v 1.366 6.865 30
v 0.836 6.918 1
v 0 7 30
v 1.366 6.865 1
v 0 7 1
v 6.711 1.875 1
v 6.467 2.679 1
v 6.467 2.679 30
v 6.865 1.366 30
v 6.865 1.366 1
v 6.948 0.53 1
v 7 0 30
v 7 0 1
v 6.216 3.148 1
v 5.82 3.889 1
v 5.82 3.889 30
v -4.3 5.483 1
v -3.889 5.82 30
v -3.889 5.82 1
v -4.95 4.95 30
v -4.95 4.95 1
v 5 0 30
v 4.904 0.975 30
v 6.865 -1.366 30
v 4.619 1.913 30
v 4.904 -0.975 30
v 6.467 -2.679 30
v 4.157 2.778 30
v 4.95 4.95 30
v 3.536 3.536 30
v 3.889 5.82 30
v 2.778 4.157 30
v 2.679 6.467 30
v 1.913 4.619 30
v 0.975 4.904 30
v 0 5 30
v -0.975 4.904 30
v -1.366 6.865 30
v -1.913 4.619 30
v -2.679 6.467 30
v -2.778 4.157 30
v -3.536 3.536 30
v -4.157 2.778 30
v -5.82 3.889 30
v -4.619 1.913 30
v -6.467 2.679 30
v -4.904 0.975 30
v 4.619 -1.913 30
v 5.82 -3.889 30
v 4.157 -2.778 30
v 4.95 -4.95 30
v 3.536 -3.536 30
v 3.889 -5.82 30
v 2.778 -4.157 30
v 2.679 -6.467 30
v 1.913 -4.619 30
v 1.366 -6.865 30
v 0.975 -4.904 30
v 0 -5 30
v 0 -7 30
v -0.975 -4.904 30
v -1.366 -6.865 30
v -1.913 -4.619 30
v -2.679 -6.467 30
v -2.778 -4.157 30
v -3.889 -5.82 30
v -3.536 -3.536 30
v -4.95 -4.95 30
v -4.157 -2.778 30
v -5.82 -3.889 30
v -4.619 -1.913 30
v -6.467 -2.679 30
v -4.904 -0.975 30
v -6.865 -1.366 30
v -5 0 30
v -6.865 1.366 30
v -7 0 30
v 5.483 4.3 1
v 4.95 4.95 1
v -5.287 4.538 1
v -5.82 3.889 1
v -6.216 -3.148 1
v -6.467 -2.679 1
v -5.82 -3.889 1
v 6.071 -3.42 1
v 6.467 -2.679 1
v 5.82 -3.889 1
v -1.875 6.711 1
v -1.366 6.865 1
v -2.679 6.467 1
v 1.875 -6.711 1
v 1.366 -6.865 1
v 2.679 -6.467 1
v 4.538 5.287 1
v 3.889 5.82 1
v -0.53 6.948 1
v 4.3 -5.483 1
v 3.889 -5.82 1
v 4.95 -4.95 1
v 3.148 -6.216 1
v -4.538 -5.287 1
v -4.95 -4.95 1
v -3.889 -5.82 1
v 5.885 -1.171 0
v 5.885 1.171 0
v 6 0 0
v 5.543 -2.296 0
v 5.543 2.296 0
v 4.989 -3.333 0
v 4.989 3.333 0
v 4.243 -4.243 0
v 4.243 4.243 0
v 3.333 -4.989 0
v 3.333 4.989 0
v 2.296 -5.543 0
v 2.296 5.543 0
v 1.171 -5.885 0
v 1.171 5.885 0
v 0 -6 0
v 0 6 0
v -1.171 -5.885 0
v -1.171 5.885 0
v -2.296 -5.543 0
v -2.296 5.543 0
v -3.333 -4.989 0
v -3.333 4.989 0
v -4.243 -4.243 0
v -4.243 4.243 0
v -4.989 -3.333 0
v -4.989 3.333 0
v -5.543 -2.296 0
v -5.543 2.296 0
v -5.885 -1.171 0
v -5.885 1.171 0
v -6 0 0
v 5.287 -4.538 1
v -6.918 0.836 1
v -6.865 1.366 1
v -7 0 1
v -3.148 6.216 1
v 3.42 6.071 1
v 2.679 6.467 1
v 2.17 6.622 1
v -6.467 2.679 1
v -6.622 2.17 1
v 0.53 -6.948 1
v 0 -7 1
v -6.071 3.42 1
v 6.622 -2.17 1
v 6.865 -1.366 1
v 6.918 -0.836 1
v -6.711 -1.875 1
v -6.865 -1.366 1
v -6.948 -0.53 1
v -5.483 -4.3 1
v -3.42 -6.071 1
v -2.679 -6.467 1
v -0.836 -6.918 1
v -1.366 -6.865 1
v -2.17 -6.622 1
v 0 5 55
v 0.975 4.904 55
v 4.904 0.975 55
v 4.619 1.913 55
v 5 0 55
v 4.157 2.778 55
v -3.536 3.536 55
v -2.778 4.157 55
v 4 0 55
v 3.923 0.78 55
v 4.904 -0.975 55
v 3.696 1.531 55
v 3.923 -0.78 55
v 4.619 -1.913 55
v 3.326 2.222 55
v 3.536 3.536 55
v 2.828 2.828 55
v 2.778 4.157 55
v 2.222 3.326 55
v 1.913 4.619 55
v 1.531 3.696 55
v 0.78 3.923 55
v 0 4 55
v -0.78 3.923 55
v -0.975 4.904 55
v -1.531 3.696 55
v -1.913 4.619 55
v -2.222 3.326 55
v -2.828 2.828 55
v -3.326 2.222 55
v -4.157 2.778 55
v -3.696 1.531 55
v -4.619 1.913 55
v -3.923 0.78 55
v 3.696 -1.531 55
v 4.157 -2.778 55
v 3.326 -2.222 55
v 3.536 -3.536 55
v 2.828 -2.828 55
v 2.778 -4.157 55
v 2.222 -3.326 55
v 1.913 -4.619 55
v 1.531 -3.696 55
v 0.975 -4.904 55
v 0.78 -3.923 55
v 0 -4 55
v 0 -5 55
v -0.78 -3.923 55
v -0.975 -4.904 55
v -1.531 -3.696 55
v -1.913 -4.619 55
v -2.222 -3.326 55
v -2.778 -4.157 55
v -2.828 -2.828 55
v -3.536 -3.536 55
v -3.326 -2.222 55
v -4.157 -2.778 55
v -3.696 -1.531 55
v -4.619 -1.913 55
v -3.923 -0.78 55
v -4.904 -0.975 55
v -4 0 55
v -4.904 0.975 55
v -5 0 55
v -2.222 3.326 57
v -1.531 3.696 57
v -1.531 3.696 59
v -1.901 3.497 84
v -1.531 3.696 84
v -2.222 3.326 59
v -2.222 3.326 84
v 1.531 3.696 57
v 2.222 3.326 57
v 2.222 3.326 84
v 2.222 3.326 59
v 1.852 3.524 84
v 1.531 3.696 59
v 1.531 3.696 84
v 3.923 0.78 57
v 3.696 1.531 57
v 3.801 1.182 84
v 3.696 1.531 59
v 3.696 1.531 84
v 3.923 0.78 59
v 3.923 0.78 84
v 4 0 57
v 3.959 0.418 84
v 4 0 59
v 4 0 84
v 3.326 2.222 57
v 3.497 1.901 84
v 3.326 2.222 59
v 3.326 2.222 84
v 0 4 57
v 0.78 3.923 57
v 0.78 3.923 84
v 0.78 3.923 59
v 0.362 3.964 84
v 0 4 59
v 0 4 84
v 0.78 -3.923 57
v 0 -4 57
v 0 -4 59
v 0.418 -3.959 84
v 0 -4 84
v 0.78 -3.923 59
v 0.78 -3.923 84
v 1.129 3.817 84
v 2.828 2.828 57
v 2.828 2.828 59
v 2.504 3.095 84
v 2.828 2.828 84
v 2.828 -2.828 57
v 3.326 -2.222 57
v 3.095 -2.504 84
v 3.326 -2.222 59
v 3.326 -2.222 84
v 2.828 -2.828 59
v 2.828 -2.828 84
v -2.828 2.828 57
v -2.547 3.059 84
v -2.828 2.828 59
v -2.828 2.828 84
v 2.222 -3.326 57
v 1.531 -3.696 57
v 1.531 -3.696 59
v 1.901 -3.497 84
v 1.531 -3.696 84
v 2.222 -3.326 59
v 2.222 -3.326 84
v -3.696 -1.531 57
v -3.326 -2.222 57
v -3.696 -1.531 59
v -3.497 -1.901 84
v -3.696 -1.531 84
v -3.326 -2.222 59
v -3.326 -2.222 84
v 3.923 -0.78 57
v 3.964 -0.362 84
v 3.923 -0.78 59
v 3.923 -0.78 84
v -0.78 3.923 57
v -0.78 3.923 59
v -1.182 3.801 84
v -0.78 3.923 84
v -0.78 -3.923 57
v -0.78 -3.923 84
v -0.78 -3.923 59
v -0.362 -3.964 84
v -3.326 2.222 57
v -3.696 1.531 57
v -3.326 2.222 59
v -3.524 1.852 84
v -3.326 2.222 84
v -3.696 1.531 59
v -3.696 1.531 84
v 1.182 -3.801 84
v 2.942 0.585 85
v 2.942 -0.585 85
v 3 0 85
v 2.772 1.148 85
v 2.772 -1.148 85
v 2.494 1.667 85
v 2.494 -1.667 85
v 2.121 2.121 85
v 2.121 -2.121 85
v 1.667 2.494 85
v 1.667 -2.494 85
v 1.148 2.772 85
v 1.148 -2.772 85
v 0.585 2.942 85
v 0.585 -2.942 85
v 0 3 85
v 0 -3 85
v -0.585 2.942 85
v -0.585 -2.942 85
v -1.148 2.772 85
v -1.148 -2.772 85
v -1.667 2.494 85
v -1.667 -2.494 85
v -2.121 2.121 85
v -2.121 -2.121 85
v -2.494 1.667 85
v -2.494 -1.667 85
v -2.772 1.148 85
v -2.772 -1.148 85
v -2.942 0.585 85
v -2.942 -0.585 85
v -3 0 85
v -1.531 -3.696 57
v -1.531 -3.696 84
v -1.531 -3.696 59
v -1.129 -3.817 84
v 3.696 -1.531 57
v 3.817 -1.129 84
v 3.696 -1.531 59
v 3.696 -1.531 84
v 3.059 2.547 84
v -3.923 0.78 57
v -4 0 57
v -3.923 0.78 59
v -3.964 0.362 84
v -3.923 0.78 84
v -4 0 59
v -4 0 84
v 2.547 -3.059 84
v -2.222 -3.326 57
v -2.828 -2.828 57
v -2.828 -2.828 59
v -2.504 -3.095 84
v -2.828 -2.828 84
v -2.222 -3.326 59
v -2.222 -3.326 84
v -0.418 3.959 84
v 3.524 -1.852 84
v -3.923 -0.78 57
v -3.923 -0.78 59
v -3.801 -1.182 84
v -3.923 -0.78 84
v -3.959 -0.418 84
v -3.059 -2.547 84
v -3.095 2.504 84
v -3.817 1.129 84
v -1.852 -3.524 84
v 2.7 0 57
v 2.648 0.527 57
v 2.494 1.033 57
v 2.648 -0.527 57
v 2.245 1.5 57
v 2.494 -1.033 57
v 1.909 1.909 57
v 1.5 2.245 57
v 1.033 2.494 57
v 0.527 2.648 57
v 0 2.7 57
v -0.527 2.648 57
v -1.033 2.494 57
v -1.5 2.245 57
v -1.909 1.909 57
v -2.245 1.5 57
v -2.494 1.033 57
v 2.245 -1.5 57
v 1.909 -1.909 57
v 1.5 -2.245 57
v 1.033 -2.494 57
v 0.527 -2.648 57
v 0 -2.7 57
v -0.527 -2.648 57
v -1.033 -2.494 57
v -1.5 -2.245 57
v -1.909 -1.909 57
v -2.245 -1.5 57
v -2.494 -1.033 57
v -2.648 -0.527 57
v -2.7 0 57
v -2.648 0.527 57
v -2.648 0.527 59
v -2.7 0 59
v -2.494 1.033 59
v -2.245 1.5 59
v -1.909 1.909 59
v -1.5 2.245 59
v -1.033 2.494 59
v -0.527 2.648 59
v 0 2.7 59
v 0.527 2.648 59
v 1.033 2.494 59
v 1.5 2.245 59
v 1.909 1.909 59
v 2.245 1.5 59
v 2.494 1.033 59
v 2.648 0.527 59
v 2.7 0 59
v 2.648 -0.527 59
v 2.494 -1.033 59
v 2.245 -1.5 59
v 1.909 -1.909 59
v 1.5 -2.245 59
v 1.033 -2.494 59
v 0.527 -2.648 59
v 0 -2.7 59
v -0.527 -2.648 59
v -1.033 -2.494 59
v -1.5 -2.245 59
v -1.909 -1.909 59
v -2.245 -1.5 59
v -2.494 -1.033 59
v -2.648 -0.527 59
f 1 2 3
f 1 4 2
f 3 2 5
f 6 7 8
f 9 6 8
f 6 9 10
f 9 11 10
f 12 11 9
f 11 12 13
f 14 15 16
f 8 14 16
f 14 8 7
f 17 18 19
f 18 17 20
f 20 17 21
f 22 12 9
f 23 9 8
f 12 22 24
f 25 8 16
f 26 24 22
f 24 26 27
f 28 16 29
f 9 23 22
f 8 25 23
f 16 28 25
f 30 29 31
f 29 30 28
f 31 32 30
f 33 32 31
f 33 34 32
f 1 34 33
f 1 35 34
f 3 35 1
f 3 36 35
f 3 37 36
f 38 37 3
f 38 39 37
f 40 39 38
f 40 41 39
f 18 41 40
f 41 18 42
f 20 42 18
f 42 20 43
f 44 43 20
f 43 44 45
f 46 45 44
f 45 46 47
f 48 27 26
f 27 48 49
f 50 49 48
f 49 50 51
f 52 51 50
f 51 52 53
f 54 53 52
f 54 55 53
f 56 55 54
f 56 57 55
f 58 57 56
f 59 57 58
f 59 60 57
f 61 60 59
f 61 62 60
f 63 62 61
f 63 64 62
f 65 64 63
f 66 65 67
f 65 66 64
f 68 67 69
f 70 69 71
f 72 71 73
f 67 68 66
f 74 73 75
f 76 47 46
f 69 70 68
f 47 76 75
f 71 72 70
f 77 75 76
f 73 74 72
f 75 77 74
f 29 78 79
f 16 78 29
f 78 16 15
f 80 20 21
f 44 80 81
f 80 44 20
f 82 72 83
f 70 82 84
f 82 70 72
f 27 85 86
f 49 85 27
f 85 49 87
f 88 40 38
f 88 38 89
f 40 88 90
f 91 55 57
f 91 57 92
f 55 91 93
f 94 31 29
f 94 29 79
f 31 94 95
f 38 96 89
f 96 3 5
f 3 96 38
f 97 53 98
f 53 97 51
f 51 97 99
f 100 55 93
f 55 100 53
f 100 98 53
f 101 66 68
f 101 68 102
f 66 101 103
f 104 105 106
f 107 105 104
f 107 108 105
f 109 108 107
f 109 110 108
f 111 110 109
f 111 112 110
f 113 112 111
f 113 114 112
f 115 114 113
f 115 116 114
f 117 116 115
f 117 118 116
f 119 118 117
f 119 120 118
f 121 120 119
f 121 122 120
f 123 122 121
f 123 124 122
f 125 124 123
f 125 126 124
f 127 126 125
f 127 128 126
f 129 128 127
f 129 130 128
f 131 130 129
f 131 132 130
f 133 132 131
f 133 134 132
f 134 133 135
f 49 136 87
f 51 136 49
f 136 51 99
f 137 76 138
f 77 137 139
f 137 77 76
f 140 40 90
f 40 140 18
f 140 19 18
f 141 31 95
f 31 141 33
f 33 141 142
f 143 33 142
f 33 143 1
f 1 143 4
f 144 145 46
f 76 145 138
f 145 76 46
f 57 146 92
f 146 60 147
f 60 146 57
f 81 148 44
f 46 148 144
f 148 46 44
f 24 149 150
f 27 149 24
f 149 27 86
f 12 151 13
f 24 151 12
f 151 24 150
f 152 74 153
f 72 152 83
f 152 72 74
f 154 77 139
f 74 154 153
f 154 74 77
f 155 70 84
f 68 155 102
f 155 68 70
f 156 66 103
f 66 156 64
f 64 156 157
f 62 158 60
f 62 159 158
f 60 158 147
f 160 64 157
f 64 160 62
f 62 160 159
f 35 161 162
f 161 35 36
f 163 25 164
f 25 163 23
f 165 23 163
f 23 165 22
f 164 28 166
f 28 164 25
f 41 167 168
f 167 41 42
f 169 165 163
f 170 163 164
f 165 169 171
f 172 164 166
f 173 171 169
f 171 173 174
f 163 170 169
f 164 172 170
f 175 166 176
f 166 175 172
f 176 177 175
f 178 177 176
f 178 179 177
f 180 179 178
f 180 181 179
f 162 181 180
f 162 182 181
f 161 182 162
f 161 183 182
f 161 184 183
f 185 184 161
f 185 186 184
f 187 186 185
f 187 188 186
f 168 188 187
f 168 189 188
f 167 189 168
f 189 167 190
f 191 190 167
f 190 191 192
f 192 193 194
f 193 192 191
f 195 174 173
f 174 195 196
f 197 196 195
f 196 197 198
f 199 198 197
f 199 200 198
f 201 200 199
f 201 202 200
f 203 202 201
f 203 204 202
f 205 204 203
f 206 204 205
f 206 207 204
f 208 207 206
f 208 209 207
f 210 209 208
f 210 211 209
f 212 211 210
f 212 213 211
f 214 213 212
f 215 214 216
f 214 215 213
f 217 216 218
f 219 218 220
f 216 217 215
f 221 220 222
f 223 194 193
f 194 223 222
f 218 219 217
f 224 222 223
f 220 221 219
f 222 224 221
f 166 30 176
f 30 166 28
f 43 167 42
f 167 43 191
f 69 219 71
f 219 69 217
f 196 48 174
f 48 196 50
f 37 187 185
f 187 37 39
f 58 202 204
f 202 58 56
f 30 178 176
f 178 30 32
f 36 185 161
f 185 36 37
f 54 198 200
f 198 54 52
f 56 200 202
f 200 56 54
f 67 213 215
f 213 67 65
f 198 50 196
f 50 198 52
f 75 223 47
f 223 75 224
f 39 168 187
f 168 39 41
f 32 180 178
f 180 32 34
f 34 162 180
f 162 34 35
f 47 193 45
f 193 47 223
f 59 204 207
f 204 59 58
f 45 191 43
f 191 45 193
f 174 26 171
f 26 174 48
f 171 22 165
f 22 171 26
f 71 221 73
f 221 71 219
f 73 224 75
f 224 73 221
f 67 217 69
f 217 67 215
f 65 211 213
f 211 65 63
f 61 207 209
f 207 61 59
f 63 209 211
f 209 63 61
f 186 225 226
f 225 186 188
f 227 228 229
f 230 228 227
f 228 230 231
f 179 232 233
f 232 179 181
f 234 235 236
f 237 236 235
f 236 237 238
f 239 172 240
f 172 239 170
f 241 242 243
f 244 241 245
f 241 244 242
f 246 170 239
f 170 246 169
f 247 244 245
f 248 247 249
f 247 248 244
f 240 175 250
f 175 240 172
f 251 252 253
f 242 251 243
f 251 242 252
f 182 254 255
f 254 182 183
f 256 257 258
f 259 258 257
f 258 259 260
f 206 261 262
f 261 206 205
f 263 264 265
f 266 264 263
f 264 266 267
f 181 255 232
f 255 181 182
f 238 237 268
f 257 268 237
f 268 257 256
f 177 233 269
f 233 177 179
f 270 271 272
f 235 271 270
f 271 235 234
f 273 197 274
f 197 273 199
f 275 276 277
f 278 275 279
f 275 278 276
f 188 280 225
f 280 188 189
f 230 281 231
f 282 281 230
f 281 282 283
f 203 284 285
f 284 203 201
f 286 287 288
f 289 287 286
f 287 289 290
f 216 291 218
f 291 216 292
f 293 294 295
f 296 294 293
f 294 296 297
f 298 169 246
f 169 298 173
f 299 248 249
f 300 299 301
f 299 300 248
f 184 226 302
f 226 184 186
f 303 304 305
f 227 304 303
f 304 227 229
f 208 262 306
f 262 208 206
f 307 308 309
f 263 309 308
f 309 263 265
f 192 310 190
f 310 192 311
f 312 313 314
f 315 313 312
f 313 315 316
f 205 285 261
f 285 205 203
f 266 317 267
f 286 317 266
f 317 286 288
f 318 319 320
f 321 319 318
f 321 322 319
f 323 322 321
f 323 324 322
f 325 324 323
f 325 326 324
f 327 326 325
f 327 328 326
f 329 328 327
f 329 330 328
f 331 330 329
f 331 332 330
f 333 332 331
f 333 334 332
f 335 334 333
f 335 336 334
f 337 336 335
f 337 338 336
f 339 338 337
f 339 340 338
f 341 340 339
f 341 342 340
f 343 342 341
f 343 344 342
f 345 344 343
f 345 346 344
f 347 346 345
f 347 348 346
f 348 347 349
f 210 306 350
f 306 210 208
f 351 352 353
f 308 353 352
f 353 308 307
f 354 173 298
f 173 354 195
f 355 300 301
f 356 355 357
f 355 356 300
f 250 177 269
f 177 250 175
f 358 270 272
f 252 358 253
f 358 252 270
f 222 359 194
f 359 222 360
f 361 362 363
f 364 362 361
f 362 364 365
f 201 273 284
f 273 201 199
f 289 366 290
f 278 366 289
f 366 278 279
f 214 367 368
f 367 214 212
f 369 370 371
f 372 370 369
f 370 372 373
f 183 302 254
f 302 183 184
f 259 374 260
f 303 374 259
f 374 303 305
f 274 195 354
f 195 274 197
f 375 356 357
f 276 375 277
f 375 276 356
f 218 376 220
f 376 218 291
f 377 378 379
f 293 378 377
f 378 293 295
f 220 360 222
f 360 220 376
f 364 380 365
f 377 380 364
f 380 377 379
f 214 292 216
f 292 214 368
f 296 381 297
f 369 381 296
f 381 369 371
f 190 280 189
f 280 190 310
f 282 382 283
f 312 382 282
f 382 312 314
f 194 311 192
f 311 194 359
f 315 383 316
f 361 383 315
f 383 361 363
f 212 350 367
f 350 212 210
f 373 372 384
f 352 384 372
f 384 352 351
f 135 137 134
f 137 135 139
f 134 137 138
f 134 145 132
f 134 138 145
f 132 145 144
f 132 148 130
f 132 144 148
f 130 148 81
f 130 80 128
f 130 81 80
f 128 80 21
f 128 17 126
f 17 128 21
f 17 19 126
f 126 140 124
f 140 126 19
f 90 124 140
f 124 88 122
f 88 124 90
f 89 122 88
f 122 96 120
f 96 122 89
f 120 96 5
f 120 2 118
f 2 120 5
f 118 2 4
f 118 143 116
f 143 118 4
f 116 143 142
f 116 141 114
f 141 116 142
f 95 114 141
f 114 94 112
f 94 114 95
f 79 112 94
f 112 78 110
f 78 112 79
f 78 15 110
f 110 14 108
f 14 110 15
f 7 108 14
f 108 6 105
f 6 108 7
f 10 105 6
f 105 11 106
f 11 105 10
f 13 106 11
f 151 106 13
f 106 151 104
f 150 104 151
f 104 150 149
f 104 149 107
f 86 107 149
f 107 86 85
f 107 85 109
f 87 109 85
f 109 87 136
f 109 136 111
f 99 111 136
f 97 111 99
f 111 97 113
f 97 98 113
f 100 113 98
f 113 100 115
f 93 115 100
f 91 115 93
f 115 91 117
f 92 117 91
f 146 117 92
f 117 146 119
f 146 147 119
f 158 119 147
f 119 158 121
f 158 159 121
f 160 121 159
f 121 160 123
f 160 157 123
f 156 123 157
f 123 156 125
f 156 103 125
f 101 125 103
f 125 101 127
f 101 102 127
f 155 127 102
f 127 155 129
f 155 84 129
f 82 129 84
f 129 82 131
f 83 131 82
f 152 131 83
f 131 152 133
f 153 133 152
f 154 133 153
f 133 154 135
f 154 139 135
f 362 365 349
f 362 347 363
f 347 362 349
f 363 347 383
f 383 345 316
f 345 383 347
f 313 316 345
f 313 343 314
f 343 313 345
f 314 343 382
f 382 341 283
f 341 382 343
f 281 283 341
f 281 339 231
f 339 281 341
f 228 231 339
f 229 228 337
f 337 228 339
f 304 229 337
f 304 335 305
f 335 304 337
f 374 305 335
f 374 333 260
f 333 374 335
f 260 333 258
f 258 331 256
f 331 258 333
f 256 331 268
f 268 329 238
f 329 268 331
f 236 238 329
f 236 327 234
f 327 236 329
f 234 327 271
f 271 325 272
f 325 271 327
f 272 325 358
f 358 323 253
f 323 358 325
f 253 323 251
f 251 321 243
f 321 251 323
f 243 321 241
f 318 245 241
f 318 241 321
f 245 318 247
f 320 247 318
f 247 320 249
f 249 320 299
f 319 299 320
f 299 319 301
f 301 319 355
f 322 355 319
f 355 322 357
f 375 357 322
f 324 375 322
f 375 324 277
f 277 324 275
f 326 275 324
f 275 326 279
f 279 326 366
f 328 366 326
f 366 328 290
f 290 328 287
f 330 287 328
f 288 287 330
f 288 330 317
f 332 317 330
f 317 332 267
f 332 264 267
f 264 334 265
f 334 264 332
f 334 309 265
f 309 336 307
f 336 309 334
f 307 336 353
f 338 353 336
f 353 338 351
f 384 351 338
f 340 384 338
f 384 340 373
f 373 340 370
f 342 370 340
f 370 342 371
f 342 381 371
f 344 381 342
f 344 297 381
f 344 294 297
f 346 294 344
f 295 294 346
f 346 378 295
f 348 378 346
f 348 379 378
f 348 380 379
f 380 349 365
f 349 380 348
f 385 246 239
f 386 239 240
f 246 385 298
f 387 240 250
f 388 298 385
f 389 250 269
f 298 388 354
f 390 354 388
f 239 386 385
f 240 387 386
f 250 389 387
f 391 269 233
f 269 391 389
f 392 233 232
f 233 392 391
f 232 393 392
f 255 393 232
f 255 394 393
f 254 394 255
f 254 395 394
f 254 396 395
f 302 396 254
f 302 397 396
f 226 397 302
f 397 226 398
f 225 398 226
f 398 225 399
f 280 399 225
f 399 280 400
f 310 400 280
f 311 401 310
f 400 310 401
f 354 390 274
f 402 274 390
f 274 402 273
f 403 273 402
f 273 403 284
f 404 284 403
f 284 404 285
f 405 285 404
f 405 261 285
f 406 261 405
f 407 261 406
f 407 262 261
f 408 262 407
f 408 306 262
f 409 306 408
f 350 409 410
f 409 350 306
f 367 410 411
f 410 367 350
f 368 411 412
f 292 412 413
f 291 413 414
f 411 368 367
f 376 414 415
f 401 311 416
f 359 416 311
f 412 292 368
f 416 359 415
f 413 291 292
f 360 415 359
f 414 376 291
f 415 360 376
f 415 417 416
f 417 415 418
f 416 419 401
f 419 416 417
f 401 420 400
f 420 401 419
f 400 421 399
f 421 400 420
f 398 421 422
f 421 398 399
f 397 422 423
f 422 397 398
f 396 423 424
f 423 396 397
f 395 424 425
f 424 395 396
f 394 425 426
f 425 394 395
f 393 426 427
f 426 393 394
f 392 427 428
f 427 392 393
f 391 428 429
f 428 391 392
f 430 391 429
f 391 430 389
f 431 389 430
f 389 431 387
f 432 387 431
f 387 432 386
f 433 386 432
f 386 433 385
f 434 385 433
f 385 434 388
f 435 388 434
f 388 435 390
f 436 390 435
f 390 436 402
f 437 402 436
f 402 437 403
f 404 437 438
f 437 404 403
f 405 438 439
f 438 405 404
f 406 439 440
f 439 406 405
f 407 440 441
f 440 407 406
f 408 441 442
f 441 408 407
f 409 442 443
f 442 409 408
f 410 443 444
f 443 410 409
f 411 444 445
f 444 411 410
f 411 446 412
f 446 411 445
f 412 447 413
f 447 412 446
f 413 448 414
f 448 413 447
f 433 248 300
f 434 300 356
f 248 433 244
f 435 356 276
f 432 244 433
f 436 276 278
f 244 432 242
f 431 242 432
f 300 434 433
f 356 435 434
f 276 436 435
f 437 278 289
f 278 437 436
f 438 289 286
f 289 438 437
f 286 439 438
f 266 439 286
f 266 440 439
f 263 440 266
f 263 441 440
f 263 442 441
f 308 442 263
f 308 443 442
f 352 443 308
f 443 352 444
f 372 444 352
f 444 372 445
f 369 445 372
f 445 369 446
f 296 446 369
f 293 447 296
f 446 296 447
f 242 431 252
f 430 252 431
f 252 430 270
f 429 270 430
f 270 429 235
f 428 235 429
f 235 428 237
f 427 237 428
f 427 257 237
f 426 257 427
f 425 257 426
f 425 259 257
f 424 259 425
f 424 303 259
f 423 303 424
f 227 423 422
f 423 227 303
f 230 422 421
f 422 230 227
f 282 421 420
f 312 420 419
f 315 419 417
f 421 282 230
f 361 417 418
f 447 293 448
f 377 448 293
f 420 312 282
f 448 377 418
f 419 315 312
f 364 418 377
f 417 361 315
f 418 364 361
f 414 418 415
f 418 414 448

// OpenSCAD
$fn = 32;

// ----------------------------------------------------------------------
// Stepped shaft: diameters 14, 10, 8 mm, 85 mm long
// ----------------------------------------------------------------------

// --- parameters (mm) ---
d1 = 14;                  // step 1 diameter
len1 = 30;                // step 1 length
d2 = 10;                  // step 2 diameter
len2 = 25;                // step 2 length
d3 = 8;                   // step 3 diameter
len3 = 30;                // step 3 length
total = 85;               // overall length
chamfer = 1;              // end chamfer
groove_r = 4;             // groove radius
groove_z = 57;            // groove position from the end
groove_w = 2;             // groove width
groove_d = 1.3;           // groove depth

difference() {
  /* turned body: stacked cylinders, every step sunk into the bigger one */
  union() {
    cylinder(h = len1, d = d1);
    translate([0, 0, 29.6]) cylinder(h = 25.4, d = d2);
    translate([0, 0, 54.6]) cylinder(h = 30.4, d = d3);
  }
  /* bottom chamfer ring cut */
  rotate_extrude() translate([6, -2.5]) polygon([[0, 0], [3.5, 0], [3.5, 6], [0, 2.5]]);
  /* top chamfer ring cut */
  rotate_extrude() translate([3, 85]) polygon([[0, 0], [3.5, -3.5], [3.5, 2.5], [0, 2.5]]);
  /* circlip groove just behind the shoulder */
  rotate_extrude() translate([groove_r - groove_d, groove_z]) square([groove_d + 2.5, groove_w]);
}
